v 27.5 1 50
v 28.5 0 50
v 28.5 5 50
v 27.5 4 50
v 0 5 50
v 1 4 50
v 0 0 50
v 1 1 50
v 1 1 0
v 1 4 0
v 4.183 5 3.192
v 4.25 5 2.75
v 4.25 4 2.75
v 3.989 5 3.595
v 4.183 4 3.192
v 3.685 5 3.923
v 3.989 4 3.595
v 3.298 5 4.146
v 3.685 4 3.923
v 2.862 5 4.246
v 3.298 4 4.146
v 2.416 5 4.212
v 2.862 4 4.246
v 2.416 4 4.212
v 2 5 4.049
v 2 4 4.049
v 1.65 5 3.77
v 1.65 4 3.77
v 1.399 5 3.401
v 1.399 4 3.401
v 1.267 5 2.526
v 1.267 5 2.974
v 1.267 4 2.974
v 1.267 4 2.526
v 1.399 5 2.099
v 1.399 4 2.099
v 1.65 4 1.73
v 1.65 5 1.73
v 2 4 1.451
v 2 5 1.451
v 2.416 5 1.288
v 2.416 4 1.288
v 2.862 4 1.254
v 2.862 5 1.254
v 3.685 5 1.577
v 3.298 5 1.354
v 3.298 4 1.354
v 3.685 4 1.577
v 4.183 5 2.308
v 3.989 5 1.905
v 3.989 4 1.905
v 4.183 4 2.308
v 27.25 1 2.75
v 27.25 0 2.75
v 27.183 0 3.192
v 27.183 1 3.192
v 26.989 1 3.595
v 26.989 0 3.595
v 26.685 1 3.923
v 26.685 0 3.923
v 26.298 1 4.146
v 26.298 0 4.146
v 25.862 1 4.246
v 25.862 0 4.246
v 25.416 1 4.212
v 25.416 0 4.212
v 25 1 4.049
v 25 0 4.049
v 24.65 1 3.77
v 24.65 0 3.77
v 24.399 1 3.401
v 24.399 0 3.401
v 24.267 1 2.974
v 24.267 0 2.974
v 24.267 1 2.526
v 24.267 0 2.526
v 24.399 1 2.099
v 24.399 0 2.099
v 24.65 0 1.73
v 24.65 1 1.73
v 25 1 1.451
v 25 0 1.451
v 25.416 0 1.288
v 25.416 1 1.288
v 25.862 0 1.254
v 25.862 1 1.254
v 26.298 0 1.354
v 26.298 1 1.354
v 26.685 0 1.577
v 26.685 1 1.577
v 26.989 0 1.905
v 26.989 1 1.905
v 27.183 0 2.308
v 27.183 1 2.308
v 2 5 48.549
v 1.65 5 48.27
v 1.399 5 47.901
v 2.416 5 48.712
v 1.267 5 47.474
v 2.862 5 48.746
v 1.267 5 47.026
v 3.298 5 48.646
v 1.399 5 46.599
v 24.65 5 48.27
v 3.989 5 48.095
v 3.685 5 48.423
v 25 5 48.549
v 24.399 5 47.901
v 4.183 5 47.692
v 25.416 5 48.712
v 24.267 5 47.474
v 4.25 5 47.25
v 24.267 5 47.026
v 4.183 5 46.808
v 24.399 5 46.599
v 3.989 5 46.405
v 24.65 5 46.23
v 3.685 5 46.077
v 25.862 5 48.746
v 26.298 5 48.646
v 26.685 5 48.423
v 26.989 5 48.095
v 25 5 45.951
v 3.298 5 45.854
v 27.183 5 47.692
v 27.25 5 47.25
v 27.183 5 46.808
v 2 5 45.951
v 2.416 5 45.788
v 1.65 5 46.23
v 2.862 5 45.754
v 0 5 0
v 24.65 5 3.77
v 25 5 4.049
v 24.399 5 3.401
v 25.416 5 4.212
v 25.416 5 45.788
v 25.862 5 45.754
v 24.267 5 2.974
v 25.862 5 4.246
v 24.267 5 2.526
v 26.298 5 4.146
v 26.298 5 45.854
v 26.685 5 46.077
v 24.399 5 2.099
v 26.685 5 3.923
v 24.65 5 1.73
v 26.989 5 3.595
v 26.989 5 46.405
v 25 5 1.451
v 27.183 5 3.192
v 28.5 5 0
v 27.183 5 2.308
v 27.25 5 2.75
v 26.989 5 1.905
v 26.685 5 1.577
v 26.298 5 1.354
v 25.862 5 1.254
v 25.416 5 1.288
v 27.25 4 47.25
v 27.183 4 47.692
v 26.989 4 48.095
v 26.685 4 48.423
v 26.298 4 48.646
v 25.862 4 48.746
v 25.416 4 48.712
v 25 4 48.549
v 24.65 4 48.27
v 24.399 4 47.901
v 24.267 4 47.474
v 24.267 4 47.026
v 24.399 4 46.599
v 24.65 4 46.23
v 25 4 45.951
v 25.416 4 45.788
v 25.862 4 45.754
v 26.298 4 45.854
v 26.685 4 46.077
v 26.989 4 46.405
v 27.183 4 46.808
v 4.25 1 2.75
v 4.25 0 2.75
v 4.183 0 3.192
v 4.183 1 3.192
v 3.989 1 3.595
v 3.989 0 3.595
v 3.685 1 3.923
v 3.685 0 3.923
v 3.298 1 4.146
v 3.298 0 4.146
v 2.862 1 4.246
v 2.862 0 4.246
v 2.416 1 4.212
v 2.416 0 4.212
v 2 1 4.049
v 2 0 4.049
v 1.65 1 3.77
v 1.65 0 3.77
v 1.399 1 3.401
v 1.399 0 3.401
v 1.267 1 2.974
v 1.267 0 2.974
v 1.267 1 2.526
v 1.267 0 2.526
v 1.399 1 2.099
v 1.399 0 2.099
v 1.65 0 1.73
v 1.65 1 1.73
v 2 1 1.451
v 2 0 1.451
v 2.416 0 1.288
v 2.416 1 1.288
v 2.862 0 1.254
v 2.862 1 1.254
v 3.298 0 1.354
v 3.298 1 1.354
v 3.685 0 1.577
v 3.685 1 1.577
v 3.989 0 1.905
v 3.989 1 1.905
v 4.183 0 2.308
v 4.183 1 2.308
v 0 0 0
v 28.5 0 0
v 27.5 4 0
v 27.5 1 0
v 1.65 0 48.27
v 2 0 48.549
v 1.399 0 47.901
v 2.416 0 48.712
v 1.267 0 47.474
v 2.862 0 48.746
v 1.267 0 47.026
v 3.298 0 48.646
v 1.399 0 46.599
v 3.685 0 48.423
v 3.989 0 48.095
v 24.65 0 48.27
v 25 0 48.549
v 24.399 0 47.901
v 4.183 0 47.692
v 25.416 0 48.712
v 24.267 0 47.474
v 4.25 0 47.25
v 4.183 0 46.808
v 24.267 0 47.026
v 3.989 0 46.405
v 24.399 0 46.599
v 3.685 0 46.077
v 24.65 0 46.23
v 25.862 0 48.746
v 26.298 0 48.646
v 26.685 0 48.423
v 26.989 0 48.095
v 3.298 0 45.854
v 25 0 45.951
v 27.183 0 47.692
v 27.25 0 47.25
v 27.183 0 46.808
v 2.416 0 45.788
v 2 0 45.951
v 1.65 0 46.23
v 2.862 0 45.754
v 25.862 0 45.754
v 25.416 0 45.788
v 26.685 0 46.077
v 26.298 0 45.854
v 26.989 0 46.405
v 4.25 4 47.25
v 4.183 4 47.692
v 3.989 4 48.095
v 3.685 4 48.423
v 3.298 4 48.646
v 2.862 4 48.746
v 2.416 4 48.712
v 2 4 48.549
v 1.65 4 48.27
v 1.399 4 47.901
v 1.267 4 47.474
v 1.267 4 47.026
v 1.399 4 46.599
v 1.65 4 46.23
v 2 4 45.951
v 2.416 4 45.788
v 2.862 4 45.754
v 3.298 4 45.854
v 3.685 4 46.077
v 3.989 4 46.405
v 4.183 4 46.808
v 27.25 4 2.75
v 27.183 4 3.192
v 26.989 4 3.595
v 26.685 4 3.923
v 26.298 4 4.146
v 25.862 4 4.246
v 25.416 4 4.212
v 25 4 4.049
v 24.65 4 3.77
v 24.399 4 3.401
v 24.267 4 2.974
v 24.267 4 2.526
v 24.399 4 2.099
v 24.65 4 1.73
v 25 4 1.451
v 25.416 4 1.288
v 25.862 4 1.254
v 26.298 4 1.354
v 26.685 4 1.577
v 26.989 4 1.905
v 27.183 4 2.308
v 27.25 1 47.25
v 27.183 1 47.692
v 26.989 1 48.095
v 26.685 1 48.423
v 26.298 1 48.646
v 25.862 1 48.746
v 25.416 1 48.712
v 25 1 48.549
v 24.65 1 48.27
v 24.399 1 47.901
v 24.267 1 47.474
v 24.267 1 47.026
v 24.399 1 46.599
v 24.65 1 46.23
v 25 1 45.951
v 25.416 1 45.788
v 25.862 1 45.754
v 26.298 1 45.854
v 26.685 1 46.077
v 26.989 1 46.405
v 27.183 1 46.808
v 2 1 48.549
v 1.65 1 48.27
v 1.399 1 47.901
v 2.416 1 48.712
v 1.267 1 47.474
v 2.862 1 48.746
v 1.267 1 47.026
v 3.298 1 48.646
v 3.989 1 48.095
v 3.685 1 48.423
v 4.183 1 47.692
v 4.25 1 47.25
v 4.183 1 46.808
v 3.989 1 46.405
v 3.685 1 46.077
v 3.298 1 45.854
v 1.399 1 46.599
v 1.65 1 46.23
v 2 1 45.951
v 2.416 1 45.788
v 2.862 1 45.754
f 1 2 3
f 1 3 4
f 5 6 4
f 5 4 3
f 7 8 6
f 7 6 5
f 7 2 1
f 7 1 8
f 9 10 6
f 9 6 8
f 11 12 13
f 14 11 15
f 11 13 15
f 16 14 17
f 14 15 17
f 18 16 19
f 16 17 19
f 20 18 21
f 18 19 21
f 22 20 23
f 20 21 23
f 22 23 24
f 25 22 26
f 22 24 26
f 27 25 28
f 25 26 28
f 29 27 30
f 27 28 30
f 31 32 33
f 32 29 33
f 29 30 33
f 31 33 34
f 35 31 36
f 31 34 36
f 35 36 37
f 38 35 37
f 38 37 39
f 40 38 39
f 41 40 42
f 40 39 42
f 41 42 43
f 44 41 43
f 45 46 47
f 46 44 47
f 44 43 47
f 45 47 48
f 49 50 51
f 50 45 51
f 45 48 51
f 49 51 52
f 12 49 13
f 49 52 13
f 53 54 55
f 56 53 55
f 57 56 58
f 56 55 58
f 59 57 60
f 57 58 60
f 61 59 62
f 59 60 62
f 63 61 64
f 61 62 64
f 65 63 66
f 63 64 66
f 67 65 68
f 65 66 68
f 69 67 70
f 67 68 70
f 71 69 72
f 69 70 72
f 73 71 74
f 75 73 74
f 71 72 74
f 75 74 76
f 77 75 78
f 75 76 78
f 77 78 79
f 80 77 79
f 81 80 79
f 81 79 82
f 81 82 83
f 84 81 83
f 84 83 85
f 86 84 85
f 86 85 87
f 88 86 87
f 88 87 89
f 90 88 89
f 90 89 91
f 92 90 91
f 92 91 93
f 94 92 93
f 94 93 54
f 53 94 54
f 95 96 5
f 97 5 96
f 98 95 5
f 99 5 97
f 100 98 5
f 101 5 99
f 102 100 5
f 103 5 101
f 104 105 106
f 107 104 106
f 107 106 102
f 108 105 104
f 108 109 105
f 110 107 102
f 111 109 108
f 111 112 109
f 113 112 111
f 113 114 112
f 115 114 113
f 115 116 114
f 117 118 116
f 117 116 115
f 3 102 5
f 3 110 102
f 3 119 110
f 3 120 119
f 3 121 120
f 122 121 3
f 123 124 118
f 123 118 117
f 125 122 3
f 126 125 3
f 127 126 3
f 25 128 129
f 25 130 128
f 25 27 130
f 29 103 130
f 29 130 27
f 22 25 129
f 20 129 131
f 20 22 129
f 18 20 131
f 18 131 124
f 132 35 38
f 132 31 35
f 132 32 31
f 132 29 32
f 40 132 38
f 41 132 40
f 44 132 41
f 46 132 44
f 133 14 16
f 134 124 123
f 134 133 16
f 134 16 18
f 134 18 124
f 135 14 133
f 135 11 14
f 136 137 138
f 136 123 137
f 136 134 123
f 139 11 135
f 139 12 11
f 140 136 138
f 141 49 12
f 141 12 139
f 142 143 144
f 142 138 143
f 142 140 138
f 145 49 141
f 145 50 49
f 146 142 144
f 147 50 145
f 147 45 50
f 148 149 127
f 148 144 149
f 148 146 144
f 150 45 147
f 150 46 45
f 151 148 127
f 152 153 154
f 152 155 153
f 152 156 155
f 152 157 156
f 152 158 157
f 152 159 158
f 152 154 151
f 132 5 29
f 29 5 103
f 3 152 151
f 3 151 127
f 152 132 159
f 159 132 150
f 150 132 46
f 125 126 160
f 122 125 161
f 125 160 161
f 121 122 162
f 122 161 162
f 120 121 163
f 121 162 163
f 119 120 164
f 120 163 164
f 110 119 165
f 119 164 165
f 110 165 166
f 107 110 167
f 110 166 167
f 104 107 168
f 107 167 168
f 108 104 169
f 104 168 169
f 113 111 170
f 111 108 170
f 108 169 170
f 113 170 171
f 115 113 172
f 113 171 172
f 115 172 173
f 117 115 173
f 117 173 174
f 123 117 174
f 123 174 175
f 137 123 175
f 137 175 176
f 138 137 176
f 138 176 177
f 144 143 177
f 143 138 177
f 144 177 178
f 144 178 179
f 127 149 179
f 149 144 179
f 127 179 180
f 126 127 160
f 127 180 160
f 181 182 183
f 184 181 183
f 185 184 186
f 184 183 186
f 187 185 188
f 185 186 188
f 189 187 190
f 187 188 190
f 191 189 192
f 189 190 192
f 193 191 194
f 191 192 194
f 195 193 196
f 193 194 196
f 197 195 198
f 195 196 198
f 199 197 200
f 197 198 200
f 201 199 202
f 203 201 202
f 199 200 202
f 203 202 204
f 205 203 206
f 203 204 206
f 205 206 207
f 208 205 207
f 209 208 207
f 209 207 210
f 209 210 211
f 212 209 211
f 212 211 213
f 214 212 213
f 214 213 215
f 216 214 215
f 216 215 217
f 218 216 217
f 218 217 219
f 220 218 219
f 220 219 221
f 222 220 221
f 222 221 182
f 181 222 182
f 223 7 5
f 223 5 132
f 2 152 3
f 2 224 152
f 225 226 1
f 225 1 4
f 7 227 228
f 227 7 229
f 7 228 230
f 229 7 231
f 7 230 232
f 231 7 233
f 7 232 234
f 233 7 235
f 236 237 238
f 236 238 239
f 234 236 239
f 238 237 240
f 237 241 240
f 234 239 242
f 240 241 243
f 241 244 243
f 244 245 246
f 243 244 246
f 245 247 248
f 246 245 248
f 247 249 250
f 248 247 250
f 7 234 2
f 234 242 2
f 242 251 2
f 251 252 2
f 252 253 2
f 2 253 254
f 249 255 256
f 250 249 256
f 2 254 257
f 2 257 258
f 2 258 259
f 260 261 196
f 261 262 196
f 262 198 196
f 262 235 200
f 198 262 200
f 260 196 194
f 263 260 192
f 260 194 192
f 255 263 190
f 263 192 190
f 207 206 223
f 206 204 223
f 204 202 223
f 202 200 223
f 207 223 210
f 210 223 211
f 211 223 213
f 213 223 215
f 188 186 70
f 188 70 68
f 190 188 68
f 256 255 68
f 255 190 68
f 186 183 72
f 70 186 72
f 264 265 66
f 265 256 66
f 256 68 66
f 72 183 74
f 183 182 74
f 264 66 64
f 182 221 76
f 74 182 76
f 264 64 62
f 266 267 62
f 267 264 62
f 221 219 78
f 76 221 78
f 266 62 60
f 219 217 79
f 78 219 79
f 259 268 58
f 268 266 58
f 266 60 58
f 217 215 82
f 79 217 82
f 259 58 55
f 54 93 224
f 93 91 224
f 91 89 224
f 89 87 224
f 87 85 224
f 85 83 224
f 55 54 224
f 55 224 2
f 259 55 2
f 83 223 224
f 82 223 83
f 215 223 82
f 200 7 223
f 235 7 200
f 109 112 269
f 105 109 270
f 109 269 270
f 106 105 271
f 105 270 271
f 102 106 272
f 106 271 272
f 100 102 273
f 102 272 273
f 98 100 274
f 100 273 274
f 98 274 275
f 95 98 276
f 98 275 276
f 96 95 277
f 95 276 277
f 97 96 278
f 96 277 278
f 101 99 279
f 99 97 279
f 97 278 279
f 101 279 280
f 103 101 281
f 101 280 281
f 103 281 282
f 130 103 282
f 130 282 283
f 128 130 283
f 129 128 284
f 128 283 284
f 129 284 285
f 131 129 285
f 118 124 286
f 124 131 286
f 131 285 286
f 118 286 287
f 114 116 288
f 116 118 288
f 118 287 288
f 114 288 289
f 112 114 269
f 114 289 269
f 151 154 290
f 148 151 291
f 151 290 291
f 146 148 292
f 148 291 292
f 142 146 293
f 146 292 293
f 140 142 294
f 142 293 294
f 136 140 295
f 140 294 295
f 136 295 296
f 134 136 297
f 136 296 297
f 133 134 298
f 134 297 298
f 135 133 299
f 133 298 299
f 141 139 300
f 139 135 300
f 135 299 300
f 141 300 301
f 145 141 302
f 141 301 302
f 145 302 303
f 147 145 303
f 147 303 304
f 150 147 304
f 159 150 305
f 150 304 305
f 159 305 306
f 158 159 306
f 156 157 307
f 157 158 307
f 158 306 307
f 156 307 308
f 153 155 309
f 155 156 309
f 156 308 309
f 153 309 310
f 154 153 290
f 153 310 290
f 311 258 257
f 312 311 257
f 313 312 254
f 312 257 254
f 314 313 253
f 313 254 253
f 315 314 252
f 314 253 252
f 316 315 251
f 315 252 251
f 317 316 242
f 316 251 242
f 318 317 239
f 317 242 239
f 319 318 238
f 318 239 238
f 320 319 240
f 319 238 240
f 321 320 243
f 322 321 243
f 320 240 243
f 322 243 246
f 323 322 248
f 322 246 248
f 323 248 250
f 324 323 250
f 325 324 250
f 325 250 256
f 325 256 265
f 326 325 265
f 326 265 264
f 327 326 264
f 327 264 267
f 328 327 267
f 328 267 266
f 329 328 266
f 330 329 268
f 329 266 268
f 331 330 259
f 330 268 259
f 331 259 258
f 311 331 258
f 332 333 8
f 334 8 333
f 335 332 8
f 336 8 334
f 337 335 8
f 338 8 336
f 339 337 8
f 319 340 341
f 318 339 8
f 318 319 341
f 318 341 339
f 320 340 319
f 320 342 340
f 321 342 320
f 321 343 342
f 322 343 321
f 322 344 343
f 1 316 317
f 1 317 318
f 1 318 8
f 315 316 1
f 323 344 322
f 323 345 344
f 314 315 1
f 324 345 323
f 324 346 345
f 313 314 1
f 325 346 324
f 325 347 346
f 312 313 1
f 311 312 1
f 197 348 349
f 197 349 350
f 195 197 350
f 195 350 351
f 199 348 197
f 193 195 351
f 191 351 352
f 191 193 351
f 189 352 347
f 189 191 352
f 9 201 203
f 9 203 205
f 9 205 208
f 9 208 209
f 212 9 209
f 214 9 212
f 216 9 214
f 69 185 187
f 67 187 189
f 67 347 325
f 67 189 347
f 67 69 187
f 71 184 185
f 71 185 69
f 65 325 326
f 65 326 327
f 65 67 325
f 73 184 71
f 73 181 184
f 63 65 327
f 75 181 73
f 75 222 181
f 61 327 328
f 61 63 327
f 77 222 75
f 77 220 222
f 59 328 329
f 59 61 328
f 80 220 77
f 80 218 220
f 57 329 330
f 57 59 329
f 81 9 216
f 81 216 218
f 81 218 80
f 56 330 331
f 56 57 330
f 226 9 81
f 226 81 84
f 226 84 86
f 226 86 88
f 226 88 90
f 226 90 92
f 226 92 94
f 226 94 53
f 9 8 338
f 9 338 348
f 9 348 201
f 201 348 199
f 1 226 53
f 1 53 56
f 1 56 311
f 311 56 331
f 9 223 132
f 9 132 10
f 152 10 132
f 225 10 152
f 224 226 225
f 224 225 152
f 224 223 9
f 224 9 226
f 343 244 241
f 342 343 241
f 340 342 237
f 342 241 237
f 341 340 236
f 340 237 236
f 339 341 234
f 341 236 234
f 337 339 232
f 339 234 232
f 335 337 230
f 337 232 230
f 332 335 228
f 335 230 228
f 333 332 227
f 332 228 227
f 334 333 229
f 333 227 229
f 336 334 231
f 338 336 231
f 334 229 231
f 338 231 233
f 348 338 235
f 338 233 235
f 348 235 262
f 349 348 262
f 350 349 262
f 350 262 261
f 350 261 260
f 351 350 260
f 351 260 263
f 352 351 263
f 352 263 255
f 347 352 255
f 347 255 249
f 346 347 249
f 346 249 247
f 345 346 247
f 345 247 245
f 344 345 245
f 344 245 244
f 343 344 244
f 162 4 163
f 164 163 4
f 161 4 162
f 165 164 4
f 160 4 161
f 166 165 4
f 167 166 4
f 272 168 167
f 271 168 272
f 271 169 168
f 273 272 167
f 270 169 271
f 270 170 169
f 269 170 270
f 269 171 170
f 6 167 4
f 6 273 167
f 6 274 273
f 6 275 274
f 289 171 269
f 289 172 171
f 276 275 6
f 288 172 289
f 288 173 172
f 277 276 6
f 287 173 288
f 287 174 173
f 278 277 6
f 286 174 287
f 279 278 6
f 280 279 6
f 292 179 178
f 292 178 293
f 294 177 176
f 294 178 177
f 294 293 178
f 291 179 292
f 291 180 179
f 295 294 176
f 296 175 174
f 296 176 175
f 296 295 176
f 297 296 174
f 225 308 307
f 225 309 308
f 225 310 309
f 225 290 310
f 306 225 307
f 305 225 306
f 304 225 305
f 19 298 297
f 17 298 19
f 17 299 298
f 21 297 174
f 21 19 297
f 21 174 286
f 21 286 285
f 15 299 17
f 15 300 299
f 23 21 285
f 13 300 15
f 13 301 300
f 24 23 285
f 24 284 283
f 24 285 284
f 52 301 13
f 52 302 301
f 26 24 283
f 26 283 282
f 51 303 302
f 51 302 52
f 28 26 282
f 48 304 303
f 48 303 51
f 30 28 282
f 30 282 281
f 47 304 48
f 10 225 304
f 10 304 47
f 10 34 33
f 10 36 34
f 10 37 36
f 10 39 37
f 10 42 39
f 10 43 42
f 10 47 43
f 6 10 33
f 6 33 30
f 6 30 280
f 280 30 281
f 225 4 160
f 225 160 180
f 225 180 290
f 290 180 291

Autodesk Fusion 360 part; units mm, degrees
sketch "Esquisse1" plane through (0, 0, 0) normal (0, 1, 0) x (1, 0, 0)
  line L0 (0, 0) -> (28.5, 0)
  line L1 (28.5, 0) -> (28.5, -50)
  line L2 (28.5, -50) -> (0, -50)
  line L3 (0, -50) -> (0, 0)
  circle A0 centre (2.75, -2.75) radius 1.5
  circle A1 centre (25.75, -2.75) radius 1.5
  circle A2 centre (2.75, -47.25) radius 1.5
  circle A3 centre (25.75, -47.25) radius 1.5
  dimension "d1" = 28.5
  dimension "d2" = 50
  dimension "d3" = 3
  dimension "d4" = 3
  dimension "d5" = 3
  dimension "d6" = 3
  dimension "d7" = 2.75
  dimension "d8" = 2.75
  dimension "d9" = 2.75
  dimension "d10" = 2.75
  dimension "d11" = 2.75
  dimension "d12" = 2.75
  dimension "d13" = 2.75
  dimension "d14" = 2.75
extrude "Extrusion1" add sketch "Esquisse1" along normal blind 5
sketch "Esquisse2" plane through (0, 0, 0) normal (0, 0, -1) x (-1, 0, 0)
  line L0 (-28.5, 0) -> (0, 0)
  line L1 (0, 0) -> (0, 5)
  line L2 (0, 5) -> (-28.5, 5)
  line L3 (-28.5, 5) -> (-28.5, 0)
  line L4 (-27.5, 4) -> (-1, 4)
  line L5 (-1, 4) -> (-1, 1)
  line L6 (-1, 1) -> (-27.5, 1)
  line L7 (-27.5, 1) -> (-27.5, 4)
  dimension "d17" = 1
  dimension "d18" = 1
  dimension "d19" = 1
  dimension "d20" = 1
extrude "Extrusion2" cut sketch "Esquisse2" against normal blind 71 contours L4 L5 L6 L7
sketch "Esquisse3" plane through (0, 5, 0) normal (0, 1, 0) x (-1, 0, 0)
  circle A0 centre (-2.75, 2.75) radius 1.5
  circle A1 centre (-2.75, 47.25) radius 1.5
  circle A2 centre (-25.75, 2.75) radius 1.5
  circle A3 centre (-25.75, 47.25) radius 1.5
  line L0 (0, 50) -> (-28.5, 50)
  line L1 (-28.5, 50) -> (-28.5, 0)
  line L2 (-28.5, 0) -> (0, 0)
  line L3 (0, 0) -> (0, 50)
